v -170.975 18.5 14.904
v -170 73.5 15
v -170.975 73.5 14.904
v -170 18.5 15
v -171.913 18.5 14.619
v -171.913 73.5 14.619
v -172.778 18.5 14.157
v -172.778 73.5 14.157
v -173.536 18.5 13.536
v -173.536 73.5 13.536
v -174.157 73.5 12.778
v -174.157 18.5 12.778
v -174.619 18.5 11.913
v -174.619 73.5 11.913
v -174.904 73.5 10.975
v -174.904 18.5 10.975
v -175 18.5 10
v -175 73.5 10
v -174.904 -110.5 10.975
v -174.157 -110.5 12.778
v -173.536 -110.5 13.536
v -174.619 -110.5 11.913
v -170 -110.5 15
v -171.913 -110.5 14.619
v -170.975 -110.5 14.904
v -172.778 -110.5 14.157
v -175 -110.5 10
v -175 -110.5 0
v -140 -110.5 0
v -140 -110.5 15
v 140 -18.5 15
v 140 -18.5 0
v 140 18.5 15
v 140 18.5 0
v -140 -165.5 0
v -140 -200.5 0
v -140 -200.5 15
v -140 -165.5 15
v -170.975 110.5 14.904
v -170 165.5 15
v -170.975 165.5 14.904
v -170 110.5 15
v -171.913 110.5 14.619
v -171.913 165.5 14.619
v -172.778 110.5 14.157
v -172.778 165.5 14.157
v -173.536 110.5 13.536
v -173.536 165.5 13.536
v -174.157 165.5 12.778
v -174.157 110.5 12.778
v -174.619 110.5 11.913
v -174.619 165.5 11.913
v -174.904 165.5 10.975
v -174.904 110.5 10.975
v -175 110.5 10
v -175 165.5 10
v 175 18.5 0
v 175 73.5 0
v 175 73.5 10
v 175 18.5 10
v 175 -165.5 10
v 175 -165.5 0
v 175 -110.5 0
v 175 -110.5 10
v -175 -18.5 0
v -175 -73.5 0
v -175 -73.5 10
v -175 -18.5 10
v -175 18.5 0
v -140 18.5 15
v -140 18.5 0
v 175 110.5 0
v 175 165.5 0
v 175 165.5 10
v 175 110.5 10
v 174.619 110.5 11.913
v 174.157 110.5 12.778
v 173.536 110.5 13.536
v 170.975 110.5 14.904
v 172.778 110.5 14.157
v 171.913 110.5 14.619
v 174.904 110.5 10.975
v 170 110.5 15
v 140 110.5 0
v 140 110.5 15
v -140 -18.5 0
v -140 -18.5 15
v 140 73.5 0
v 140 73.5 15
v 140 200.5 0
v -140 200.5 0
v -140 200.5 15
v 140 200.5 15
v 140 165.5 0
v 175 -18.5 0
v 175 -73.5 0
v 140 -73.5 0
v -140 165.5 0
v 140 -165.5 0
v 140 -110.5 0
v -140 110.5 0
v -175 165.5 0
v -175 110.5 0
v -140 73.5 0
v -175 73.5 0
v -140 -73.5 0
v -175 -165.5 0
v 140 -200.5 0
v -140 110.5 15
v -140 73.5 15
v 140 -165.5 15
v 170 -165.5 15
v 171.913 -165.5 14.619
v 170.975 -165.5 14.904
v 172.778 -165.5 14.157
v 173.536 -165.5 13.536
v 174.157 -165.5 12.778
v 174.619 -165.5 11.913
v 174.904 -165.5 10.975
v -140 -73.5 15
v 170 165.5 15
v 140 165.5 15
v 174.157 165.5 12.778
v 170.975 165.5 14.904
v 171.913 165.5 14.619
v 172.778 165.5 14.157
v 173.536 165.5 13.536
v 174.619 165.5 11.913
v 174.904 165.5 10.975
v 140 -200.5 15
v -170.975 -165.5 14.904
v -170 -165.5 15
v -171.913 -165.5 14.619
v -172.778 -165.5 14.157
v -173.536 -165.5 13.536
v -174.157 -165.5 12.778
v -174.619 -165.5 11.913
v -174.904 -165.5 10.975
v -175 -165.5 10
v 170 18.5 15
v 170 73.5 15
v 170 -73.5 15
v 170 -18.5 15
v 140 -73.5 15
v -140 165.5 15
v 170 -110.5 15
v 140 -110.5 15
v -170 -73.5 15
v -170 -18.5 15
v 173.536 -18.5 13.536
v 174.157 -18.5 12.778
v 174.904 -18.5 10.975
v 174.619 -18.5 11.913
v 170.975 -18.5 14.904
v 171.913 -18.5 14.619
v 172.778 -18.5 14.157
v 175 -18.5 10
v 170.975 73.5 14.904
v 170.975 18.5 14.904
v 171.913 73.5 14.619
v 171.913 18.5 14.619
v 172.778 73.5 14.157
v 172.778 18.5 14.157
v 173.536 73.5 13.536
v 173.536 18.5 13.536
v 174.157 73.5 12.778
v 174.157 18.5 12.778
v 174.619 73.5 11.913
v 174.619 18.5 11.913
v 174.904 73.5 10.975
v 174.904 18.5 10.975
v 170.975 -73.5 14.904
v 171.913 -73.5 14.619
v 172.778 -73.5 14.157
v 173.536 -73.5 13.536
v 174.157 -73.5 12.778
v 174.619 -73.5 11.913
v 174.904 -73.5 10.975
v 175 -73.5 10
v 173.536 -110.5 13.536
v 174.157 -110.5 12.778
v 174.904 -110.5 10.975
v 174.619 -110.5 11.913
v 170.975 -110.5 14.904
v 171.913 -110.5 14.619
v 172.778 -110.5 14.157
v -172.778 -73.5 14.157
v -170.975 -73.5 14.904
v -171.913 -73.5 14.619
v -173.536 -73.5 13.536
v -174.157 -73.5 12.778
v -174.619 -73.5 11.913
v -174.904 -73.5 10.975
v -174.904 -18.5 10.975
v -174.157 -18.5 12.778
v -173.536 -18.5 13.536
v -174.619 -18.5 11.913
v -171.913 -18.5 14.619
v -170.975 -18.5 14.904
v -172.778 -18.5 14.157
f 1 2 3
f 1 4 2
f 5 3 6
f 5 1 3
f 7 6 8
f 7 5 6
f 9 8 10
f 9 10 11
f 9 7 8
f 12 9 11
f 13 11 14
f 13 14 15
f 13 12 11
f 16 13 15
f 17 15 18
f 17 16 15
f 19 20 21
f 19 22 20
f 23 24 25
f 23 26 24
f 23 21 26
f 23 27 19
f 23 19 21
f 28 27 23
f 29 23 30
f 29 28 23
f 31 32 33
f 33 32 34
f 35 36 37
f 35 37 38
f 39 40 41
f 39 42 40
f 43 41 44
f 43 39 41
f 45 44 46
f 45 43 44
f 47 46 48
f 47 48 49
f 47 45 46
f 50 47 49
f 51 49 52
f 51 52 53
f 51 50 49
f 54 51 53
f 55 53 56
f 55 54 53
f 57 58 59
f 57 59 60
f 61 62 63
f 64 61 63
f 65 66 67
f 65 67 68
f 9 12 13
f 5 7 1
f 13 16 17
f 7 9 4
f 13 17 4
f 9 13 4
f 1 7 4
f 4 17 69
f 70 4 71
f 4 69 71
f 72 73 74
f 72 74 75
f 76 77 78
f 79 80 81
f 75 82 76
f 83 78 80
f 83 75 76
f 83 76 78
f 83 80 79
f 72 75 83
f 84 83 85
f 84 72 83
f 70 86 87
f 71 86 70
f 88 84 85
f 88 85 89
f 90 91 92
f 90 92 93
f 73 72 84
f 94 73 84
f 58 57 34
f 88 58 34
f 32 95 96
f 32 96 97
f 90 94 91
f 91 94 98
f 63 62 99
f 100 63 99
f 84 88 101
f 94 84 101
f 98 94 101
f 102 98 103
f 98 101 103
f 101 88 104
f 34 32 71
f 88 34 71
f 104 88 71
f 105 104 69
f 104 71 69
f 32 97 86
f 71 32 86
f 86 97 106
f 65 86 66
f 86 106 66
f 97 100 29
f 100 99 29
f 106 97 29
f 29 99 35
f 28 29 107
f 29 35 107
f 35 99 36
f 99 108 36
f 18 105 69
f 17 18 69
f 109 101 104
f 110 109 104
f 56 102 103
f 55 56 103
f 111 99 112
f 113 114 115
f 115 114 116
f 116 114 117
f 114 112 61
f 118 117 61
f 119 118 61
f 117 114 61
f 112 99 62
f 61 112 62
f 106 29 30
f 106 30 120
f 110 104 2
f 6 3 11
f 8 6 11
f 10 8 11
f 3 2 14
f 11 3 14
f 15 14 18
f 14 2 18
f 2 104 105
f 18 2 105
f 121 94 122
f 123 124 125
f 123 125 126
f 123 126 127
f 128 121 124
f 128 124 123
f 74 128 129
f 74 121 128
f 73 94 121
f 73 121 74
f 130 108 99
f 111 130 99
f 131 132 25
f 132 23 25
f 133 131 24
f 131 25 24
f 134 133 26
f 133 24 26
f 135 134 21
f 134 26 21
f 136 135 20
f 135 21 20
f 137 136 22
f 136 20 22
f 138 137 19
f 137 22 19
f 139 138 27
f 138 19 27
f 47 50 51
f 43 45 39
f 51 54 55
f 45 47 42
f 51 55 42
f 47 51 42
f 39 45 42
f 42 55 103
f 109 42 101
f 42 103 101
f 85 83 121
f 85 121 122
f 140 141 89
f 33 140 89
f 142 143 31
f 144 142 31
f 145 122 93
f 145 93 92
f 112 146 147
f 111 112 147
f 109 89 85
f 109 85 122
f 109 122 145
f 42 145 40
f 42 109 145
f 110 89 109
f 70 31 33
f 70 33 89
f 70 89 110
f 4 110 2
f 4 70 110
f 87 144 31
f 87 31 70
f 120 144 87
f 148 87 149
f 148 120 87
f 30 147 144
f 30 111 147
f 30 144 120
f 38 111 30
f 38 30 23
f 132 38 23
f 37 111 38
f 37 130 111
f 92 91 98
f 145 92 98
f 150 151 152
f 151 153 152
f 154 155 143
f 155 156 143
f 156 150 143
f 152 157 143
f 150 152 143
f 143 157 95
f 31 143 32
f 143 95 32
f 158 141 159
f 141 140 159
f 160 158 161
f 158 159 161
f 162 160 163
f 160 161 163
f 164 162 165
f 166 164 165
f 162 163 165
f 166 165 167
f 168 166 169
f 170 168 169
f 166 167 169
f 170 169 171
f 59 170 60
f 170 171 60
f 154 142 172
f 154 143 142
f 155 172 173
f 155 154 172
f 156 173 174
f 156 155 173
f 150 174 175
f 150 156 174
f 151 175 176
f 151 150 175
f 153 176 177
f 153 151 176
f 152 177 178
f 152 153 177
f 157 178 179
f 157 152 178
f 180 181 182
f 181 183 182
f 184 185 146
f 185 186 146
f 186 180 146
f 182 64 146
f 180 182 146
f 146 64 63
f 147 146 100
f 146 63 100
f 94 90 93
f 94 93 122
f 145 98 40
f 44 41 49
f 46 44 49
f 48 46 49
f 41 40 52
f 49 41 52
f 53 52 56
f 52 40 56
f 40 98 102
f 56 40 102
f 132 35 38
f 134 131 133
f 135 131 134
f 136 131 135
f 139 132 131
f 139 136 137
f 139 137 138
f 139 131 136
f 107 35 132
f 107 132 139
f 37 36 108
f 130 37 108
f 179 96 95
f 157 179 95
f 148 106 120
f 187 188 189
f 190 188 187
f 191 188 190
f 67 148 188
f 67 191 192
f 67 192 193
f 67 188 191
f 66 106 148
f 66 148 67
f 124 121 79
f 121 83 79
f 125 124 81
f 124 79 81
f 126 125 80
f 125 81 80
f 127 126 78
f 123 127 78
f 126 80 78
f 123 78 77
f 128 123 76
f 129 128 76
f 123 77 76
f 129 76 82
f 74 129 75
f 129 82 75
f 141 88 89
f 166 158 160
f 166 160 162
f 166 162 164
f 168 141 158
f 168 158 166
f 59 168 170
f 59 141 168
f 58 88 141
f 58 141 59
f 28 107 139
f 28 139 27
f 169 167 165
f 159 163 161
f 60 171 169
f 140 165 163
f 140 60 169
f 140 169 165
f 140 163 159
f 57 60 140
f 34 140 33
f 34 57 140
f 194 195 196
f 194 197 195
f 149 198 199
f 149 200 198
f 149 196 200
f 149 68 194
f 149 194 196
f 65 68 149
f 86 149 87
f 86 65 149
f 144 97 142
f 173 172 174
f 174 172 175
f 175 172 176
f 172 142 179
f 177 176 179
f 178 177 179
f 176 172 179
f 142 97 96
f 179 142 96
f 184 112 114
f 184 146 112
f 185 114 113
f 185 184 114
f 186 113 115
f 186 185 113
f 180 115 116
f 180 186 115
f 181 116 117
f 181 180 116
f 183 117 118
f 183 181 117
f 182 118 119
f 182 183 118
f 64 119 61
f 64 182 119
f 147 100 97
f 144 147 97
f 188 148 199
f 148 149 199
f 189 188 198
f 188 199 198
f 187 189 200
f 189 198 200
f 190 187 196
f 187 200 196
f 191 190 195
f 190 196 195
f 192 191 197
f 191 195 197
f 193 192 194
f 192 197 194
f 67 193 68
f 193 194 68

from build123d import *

# Parameters (mm, degrees)
F1_DEPTH = 15
F3_R     = 5


with BuildPart() as f1:
    # F0 (on Top) → F1 (new body)
    with BuildSketch(Plane.XY):
        Polygon((-140, 165.5), (-175, 165.5), (-175, 110.5), (-140, 110.5), (-140, 73.5), (-175, 73.5), (-175, 18.5), (-140, 18.5), (-140, 0), (0, 0), (0, 200.5), (-140, 200.5), align=None)
    extrude(amount=F1_DEPTH)

    # F2: F1 across plane


with BuildPart() as f1_1:
    add(f1.part)
    add(f1.part.mirror(Plane.XZ))

    # F3
    f3_edges = [f1_1.edges().sort_by_distance(p)[0] for p in [
        (-175, 138, 15),
        (-175, 46, 15),
        (-175, -46, 15),
        (-175, -138, 15),
    ]]
    fillet(f3_edges, radius=F3_R)

    # F4: F1 across face


with BuildPart() as f1_2:
    add(f1_1.part)
    add(f1_1.part.mirror(Plane(origin=(0, 0, 7.5), x_dir=(0, 1, 0), z_dir=(1, 0, 0))))


solid = f1_2.part
